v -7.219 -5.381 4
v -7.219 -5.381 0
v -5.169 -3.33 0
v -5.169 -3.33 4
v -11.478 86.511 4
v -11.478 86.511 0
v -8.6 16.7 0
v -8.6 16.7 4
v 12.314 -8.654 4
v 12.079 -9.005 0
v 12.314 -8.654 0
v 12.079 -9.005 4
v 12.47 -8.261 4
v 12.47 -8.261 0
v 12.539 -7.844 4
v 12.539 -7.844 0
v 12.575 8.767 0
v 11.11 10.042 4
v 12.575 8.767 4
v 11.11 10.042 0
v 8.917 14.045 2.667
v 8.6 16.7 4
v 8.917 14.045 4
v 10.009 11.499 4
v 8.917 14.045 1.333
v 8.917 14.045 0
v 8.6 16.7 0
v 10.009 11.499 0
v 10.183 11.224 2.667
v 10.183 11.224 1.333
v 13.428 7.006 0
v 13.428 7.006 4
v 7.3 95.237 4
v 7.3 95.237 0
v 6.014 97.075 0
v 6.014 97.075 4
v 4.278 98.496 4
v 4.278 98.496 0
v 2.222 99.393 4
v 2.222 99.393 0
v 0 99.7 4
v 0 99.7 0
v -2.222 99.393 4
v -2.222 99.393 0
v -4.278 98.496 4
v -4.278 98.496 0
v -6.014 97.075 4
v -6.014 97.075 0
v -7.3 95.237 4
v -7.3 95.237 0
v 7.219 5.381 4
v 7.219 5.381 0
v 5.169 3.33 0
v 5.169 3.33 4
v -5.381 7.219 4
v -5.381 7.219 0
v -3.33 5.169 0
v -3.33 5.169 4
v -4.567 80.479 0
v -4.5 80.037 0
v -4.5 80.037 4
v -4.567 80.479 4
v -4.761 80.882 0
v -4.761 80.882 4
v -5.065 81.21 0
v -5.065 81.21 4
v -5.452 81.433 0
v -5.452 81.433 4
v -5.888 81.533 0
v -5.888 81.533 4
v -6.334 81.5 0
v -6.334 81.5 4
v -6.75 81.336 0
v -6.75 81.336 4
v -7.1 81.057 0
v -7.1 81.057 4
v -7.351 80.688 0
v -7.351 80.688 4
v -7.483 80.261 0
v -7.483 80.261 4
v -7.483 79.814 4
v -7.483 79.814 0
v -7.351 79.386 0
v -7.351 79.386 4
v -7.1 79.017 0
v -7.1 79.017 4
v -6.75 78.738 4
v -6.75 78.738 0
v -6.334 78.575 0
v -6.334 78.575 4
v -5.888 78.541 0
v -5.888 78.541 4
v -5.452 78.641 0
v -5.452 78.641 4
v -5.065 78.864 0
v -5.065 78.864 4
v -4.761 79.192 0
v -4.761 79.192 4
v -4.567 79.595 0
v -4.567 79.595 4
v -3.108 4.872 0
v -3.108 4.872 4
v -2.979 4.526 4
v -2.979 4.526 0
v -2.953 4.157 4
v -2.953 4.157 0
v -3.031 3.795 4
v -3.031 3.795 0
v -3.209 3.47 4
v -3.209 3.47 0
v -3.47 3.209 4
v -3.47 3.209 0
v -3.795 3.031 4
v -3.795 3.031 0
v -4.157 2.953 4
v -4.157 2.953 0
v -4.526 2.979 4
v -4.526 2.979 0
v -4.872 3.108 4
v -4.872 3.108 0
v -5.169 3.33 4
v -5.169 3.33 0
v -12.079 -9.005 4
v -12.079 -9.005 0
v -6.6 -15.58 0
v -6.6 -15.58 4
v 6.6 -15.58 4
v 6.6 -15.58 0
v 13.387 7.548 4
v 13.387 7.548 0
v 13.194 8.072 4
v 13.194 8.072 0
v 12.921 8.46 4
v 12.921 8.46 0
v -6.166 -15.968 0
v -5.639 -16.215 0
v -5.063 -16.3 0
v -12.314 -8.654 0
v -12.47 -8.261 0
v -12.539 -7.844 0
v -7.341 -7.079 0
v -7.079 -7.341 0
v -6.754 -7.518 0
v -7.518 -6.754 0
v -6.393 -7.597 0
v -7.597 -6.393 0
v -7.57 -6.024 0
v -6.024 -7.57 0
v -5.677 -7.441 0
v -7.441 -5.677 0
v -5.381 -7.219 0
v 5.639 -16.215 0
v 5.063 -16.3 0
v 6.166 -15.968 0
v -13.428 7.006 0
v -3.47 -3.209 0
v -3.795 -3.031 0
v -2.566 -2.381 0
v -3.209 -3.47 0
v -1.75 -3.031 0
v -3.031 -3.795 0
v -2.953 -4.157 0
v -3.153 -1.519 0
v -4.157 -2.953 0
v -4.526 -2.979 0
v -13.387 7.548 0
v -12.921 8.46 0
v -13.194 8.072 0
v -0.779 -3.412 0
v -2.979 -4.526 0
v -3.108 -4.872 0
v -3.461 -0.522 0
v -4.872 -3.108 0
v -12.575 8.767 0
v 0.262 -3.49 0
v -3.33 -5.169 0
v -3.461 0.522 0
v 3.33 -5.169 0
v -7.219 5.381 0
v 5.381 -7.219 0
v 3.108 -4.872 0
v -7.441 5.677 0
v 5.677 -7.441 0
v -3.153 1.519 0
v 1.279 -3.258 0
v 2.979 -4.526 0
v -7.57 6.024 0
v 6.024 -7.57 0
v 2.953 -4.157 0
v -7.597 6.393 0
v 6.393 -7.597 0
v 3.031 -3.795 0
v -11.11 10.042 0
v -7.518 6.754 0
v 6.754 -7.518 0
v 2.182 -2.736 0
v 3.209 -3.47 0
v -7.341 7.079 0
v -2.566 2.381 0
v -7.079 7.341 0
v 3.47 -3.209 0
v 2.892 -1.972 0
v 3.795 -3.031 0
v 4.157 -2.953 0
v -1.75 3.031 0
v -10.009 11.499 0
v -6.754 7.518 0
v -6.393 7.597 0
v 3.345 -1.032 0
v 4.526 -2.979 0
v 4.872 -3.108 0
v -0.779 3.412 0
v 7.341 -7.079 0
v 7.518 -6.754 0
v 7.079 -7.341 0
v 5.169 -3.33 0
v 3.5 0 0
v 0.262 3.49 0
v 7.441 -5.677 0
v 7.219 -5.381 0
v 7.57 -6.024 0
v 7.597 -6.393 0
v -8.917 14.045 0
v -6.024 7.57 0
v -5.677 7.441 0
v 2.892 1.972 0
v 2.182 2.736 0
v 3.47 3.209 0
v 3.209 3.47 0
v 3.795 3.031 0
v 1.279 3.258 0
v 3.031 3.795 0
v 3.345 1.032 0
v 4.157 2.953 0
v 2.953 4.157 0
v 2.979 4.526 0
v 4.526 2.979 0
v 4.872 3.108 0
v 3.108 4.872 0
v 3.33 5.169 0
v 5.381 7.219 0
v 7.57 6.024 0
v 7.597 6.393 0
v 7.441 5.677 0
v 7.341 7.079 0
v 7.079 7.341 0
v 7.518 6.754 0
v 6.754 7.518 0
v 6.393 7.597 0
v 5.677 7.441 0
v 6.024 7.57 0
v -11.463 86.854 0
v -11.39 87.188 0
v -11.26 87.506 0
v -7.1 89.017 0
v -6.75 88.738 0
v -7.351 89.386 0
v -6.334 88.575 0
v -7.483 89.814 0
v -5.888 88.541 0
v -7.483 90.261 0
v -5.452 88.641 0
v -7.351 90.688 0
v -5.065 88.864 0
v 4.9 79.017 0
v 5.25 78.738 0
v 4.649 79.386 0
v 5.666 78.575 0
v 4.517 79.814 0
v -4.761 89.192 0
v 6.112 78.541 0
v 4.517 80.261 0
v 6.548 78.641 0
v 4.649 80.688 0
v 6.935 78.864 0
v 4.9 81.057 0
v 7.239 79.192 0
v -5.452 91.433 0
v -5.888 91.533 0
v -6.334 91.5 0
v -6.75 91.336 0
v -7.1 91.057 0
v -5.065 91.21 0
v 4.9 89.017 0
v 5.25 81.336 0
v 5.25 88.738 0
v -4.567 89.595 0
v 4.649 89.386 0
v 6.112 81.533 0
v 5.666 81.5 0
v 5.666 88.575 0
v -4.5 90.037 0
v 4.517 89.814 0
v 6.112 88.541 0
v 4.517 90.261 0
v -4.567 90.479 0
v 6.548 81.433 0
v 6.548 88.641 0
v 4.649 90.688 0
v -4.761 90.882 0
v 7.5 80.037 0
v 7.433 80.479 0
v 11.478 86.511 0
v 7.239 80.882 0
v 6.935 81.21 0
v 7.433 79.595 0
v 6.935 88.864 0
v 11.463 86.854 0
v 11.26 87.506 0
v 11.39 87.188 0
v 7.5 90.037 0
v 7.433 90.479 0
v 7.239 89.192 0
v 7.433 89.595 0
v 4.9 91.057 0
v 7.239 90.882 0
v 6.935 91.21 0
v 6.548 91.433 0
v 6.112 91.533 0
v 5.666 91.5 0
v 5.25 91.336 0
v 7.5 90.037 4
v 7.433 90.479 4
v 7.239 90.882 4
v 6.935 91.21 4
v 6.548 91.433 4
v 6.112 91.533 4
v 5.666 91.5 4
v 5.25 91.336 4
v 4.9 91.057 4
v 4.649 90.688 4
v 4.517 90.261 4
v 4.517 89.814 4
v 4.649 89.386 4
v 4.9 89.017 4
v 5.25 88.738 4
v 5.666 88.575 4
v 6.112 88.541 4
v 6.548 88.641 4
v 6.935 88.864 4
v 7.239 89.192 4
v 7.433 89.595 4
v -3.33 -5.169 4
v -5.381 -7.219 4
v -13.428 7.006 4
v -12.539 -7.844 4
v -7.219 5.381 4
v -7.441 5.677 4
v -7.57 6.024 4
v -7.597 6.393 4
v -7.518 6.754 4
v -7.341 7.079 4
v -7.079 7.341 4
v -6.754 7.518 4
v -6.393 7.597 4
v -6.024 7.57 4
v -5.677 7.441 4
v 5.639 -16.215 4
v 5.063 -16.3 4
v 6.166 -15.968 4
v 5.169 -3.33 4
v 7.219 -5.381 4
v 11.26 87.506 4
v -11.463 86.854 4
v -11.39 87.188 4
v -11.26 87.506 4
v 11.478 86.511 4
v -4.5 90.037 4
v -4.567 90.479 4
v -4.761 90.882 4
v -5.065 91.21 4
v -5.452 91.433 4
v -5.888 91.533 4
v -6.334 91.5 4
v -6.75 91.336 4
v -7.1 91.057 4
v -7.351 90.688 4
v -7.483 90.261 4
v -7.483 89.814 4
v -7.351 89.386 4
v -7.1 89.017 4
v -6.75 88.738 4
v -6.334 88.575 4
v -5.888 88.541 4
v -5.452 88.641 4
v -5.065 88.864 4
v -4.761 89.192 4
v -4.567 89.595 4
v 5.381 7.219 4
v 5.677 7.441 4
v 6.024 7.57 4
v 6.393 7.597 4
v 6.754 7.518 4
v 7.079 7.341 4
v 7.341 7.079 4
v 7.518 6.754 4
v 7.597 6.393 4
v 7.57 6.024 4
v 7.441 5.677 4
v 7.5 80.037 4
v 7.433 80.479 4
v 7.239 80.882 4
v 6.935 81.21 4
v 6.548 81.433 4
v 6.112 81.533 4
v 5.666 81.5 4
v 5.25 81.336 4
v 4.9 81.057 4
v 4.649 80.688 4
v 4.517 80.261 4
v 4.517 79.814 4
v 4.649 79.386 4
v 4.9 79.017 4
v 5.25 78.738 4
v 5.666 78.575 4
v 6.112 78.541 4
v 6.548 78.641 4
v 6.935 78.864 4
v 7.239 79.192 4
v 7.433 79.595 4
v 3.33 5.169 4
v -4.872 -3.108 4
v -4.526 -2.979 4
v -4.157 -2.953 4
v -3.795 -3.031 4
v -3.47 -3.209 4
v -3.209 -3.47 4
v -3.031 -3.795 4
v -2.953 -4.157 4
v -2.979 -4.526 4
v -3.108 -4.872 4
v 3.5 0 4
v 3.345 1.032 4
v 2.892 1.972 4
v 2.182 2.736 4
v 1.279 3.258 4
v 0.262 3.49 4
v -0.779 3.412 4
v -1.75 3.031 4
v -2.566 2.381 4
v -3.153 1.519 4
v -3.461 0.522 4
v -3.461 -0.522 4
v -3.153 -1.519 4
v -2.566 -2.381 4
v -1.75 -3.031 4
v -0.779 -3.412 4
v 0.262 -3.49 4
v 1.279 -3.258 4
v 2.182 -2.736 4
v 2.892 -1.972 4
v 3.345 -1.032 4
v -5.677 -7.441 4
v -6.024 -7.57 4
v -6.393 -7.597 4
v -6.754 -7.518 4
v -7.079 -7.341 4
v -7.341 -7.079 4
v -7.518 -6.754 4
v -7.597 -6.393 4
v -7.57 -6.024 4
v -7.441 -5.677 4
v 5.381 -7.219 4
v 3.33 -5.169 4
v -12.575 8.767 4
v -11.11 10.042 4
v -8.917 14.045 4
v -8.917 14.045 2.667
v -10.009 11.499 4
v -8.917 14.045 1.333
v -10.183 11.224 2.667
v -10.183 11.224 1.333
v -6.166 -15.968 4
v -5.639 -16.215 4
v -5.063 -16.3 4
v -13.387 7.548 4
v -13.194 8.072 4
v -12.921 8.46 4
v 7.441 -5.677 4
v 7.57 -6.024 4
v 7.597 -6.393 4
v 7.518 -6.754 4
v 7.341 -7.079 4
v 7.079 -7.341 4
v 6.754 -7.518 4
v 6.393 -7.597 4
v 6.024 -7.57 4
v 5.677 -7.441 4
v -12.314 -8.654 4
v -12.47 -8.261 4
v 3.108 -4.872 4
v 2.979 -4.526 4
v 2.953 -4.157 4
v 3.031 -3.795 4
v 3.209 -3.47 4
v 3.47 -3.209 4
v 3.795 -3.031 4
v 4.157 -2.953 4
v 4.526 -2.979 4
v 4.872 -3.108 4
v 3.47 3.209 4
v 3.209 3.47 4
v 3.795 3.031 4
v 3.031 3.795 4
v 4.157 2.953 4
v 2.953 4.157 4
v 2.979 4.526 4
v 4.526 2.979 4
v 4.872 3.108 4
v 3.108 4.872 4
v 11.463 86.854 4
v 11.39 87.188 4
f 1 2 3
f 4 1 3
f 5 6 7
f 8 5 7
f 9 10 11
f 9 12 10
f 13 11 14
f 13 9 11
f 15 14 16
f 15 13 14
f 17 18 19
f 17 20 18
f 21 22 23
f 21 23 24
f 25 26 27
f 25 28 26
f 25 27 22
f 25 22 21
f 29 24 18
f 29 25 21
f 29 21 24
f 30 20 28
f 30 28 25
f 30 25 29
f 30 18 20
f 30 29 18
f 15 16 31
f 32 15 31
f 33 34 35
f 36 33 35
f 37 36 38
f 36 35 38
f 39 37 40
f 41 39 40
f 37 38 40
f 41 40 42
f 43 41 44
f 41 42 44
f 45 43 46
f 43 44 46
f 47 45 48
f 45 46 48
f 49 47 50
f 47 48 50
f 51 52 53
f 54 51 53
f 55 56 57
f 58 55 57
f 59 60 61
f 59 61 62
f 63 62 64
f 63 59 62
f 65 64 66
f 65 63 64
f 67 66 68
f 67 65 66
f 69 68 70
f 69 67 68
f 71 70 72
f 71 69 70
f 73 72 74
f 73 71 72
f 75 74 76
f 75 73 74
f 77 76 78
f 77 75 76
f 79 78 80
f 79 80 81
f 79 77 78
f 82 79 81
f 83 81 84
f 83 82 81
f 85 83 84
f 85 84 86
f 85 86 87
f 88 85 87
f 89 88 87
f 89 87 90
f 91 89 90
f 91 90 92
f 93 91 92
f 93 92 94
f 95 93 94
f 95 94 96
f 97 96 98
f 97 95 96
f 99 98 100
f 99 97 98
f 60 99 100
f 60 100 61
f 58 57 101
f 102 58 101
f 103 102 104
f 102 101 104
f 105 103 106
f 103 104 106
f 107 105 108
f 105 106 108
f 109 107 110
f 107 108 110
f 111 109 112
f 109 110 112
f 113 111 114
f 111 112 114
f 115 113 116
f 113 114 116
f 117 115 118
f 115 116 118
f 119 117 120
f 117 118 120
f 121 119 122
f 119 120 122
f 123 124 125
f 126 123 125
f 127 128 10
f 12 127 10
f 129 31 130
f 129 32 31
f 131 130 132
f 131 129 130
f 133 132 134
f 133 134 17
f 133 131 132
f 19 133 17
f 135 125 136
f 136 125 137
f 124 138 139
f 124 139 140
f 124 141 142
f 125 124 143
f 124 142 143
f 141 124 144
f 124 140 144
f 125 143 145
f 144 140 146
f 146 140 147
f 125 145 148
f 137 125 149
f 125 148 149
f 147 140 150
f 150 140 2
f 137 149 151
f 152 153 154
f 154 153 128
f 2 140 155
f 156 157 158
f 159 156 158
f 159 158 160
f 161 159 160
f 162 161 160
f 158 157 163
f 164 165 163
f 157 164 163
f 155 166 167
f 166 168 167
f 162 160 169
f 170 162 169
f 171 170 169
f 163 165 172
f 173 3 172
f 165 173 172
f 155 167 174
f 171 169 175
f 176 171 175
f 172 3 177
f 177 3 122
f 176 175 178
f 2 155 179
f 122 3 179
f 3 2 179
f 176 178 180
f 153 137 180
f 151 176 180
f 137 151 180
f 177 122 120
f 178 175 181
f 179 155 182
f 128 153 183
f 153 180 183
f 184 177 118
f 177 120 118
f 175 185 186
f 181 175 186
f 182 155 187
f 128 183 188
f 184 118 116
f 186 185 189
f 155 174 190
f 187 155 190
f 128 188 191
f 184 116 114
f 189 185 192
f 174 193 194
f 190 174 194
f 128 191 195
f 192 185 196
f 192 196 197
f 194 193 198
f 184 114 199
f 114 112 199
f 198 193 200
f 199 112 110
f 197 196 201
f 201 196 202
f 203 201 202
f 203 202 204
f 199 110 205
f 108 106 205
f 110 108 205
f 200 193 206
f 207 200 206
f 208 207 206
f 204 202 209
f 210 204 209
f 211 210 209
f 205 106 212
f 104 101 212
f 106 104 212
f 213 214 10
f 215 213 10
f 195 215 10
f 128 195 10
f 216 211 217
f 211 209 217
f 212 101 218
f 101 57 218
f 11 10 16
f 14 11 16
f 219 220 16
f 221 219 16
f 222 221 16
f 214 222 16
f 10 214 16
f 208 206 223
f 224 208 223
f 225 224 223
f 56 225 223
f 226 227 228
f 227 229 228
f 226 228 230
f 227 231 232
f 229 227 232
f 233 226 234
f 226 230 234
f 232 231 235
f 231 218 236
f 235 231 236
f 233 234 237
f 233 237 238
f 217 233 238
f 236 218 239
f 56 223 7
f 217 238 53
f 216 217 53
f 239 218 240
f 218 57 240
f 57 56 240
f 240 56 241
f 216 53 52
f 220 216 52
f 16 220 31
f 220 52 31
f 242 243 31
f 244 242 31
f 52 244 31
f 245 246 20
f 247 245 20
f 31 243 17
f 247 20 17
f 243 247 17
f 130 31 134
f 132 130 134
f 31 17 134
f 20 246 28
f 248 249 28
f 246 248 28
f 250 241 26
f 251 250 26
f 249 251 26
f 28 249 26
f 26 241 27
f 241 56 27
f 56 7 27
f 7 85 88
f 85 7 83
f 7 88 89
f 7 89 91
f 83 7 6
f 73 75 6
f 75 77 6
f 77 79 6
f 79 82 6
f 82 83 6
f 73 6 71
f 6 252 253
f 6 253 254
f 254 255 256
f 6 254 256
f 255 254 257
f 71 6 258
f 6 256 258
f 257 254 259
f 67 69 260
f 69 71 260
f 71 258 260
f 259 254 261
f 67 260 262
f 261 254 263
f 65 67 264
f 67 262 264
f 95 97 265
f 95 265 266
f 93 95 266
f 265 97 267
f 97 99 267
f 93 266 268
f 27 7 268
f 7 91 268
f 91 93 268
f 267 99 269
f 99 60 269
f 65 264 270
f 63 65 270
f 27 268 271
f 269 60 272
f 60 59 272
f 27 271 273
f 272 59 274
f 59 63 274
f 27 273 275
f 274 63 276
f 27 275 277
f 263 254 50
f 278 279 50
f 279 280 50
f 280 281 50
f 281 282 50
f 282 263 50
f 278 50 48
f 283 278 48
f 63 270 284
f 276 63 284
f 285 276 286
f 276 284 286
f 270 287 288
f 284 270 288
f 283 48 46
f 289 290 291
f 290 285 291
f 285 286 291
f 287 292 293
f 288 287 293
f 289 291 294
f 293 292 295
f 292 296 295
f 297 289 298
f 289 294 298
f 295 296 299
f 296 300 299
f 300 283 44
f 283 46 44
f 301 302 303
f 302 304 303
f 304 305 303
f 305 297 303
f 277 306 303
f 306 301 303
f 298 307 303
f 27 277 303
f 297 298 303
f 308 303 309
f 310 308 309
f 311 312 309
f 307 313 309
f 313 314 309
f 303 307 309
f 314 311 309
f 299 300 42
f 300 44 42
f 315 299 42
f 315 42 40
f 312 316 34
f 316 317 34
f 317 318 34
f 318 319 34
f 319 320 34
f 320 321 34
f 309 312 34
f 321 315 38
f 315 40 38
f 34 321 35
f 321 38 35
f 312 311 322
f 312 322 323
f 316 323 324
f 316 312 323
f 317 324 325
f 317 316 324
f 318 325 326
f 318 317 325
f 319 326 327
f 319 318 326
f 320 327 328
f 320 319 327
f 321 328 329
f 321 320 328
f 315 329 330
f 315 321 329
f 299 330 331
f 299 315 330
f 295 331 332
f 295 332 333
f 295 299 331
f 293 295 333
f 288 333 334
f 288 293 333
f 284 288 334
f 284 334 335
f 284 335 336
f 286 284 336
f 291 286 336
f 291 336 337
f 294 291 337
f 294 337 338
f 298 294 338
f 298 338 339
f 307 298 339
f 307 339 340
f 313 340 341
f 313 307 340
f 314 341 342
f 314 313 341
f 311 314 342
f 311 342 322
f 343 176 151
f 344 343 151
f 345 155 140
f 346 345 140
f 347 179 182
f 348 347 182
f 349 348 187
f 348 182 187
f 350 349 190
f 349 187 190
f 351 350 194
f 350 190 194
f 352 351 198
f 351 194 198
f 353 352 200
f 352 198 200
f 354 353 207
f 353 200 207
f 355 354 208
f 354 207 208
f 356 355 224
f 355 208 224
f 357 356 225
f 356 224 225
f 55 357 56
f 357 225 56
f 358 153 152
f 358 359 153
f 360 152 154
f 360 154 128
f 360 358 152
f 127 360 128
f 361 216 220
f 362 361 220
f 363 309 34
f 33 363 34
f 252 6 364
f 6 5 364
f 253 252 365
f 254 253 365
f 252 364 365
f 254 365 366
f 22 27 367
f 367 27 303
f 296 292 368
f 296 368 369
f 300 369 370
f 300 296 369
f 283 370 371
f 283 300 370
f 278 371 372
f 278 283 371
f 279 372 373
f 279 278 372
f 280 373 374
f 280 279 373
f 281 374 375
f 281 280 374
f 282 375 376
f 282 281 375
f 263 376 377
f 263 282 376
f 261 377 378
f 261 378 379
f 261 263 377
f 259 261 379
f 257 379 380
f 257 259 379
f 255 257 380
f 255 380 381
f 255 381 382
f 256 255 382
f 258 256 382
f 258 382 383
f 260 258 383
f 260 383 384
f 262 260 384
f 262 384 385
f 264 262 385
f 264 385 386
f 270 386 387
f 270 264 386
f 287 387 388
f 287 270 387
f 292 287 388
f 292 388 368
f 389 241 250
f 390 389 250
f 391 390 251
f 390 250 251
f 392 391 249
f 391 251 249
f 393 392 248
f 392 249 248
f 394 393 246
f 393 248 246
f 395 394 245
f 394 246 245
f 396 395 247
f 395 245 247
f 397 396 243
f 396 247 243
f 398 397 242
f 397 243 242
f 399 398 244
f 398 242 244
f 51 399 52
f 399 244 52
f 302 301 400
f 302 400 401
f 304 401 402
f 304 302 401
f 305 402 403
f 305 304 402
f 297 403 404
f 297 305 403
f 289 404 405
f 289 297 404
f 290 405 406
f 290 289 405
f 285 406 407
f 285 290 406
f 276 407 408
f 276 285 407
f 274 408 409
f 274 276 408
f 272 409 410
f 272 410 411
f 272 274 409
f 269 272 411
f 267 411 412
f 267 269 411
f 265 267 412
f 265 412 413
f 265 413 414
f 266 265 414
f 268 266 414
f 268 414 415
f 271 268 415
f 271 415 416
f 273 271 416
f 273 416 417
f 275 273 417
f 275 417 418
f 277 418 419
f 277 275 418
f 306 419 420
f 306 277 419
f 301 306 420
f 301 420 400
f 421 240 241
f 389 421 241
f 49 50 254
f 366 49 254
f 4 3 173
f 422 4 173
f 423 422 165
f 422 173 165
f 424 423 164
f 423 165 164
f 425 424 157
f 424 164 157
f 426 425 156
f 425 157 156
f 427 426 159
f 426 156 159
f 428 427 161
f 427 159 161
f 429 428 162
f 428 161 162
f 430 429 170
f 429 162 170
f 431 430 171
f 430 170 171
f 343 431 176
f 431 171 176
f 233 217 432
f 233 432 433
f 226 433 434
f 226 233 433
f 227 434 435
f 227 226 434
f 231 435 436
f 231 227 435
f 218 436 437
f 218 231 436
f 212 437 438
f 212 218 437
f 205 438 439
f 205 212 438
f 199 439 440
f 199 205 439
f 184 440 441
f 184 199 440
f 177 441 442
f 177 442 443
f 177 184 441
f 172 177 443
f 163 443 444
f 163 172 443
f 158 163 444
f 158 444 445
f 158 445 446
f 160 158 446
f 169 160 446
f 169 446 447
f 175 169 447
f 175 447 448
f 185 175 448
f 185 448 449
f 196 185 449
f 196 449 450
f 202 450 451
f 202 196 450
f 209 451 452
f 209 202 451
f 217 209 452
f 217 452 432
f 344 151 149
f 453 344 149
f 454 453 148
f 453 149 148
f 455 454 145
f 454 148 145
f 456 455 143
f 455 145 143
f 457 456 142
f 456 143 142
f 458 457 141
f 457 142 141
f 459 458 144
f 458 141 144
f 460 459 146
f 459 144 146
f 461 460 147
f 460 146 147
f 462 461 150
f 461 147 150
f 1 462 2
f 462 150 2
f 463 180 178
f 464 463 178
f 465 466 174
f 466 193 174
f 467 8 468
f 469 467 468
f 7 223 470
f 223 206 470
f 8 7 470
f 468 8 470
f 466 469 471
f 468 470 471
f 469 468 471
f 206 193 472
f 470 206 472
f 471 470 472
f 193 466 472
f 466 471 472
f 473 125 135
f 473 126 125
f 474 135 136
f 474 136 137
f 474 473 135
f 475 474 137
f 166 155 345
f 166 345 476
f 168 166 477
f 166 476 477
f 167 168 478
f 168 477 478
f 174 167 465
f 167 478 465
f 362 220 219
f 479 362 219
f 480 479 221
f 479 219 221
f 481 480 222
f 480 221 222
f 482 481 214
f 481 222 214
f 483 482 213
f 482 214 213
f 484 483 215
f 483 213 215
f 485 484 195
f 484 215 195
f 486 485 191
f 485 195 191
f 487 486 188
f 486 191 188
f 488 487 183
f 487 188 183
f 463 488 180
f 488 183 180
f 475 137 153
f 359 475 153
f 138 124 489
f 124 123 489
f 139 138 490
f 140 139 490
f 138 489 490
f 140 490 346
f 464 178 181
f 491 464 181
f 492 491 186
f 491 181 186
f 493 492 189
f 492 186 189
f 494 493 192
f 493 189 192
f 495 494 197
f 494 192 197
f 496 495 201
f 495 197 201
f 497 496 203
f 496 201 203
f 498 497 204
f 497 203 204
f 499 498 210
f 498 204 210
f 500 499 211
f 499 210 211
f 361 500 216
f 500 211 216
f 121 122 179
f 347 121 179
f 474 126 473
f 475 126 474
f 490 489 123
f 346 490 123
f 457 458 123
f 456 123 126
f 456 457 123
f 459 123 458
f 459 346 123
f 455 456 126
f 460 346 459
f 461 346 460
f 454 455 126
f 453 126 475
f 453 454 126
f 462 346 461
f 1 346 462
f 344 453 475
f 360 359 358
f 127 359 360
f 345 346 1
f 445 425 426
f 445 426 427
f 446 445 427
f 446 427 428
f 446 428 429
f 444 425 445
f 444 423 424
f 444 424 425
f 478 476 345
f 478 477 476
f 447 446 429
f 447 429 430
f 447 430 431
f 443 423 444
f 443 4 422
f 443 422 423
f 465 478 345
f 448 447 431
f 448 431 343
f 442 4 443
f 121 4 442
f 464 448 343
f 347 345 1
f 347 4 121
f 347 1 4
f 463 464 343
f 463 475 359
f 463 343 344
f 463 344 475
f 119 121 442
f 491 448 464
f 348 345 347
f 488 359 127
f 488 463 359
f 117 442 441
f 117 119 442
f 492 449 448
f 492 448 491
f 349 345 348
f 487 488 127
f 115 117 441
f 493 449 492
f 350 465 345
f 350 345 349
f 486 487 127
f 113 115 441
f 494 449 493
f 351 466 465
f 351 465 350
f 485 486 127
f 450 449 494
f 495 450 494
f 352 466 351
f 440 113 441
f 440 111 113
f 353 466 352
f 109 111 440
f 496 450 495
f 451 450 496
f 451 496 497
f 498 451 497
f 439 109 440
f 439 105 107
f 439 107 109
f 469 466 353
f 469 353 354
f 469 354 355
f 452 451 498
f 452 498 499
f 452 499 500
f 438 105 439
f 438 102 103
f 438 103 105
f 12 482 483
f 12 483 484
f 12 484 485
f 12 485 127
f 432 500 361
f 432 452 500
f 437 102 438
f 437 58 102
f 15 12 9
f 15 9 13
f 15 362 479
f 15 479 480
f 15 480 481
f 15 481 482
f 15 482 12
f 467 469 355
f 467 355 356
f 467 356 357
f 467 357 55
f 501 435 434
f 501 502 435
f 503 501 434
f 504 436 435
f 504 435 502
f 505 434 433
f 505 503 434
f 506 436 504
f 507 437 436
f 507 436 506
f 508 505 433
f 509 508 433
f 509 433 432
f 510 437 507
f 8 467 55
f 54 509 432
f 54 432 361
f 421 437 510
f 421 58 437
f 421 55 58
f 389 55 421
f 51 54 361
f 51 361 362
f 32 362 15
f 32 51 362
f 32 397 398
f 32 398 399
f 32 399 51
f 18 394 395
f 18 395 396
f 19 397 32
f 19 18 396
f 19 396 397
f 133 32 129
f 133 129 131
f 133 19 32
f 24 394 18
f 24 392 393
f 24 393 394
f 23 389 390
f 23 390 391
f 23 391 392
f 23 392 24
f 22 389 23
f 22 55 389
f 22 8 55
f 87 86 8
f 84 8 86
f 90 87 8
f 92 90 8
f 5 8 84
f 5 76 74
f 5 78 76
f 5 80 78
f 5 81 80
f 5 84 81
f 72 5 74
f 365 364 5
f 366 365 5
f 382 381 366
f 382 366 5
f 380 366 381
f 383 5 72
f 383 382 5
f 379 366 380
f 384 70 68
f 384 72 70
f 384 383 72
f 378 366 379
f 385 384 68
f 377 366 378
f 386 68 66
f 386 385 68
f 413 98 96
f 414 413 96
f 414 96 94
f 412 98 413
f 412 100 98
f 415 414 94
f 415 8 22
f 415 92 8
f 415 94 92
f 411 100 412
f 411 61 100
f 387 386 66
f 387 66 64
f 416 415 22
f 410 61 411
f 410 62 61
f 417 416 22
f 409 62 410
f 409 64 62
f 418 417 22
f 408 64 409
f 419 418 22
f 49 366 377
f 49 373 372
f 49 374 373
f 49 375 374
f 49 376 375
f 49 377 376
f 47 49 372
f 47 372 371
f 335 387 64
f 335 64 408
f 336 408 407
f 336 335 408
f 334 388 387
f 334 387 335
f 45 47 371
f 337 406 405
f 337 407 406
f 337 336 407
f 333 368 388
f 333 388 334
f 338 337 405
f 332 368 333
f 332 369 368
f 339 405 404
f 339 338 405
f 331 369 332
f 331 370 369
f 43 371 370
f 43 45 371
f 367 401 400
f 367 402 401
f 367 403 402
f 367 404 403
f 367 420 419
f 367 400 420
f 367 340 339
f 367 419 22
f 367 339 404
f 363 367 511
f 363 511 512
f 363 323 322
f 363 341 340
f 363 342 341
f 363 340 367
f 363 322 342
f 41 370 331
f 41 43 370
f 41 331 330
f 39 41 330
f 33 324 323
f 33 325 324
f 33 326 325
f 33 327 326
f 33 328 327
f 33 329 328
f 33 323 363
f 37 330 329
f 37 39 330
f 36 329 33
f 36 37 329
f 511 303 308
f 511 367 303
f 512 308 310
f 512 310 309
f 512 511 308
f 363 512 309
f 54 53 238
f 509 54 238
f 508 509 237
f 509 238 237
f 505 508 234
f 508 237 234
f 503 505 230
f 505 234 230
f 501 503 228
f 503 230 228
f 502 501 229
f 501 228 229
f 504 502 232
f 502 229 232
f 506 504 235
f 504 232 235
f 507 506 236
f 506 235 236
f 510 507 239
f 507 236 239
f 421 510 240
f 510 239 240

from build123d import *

# Parameters (mm, degrees)
F0_R     = 3.5
F0_R_2   = 1.5
F1_DEPTH = 4
F2_R     = 2


with BuildPart() as f1:
    # F0 (on Top) → F1 (new body)
    with BuildSketch(Plane.XY):
        with BuildLine():
            Line((-12.5, -8.5), (-6, -16.3))
            Line((-6, -16.3), (0, -16.3))
            Line((0, -16.3), (6, -16.3))
            Line((6, -16.3), (12.5, -8.5))
            Line((12.5, -8.5), (13.5, 8.2))
            add(Edge.make_bspline(
                [(8.6, 16.7), (8.4917186517, 14.0737226405), (9.7758937627, 10.1948501542), (13.5, 8.2)],
                knots=[0, 0, 0, 0, 9.8112180691, 9.8112180691, 9.8112180691, 9.8112180691], degree=3))
            Line((8.6, 16.7), (11.5, 87.0371768306))
            Line((11.5, 87.0371768306), (7.3, 95.2371768306))
            ThreePointArc((7.3, 95.2371768306), (0, 99.7), (-7.3, 95.2371768306))
            Line((-7.3, 95.2371768306), (-11.5, 87.0371768306))
            Line((-11.5, 87.0371768306), (-8.6, 16.7))
            add(Edge.make_bspline(
                [(-8.6, 16.7), (-8.4917186517, 14.0737226405), (-9.7758937627, 10.1948501542), (-13.5, 8.2)],
                knots=[0, 0, 0, 0, 9.8112180691, 9.8112180691, 9.8112180691, 9.8112180691], degree=3))
            Line((-13.5, 8.2), (-12.5, -8.5))
        make_face()
        with BuildLine():
            Line((-7.2192388155, -5.3807611845), (-5.1686291501, -3.330151519))
            ThreePointArc((-5.1686291501, -3.330151519), (-3.330151519, -3.330151519), (-3.330151519, -5.1686291501))
            Line((-3.330151519, -5.1686291501), (-5.3807611845, -7.2192388155))
            ThreePointArc((-5.3807611845, -7.2192388155), (-7.2192388155, -7.2192388155), (-7.2192388155, -5.3807611845))
        make_face(mode=Mode.SUBTRACT)
        with BuildLine():
            ThreePointArc((-3.330151519, 5.1686291501), (-3.330151519, 3.330151519), (-5.1686291501, 3.330151519))
            Line((-5.1686291501, 3.330151519), (-7.2192388155, 5.3807611845))
            ThreePointArc((-7.2192388155, 5.3807611845), (-7.2192388155, 7.2192388155), (-5.3807611845, 7.2192388155))
            Line((-5.3807611845, 7.2192388155), (-3.330151519, 5.1686291501))
        make_face(mode=Mode.SUBTRACT)
        with BuildLine():
            Line((5.3807611845, -7.2192388155), (3.330151519, -5.1686291501))
            ThreePointArc((3.330151519, -5.1686291501), (3.330151519, -3.330151519), (5.1686291501, -3.330151519))
            Line((5.1686291501, -3.330151519), (7.2192388155, -5.3807611845))
            ThreePointArc((7.2192388155, -5.3807611845), (7.2192388155, -7.2192388155), (5.3807611845, -7.2192388155))
        make_face(mode=Mode.SUBTRACT)
        Circle(F0_R, mode=Mode.SUBTRACT)
        with BuildLine():
            Line((7.2192388155, 5.3807611845), (5.1686291501, 3.330151519))
            ThreePointArc((5.1686291501, 3.330151519), (3.330151519, 3.330151519), (3.330151519, 5.1686291501))
            Line((3.330151519, 5.1686291501), (5.3807611845, 7.2192388155))
            ThreePointArc((5.3807611845, 7.2192388155), (7.2192388155, 7.2192388155), (7.2192388155, 5.3807611845))
        make_face(mode=Mode.SUBTRACT)
        with Locations((-6, 80.0371768306)):
            Circle(F0_R_2, mode=Mode.SUBTRACT)
        with Locations((-6, 90.0371768306)):
            Circle(F0_R_2, mode=Mode.SUBTRACT)
        with Locations((6, 80.0371768306)):
            Circle(F0_R_2, mode=Mode.SUBTRACT)
        with Locations((6, 90.0371768306)):
            Circle(F0_R_2, mode=Mode.SUBTRACT)
    extrude(amount=F1_DEPTH)

    # F2
    f2_edges = [f1.edges().sort_by_distance(p)[0] for p in [
        (-11.5, 87.037177, 2),
        (11.5, 87.037177, 2),
        (13.5, 8.2, 2),
        (-13.5, 8.2, 2),
        (-12.5, -8.5, 2),
        (12.5, -8.5, 2),
        (6, -16.3, 2),
        (-6, -16.3, 2),
    ]]
    fillet(f2_edges, radius=F2_R)


solid = f1.part
